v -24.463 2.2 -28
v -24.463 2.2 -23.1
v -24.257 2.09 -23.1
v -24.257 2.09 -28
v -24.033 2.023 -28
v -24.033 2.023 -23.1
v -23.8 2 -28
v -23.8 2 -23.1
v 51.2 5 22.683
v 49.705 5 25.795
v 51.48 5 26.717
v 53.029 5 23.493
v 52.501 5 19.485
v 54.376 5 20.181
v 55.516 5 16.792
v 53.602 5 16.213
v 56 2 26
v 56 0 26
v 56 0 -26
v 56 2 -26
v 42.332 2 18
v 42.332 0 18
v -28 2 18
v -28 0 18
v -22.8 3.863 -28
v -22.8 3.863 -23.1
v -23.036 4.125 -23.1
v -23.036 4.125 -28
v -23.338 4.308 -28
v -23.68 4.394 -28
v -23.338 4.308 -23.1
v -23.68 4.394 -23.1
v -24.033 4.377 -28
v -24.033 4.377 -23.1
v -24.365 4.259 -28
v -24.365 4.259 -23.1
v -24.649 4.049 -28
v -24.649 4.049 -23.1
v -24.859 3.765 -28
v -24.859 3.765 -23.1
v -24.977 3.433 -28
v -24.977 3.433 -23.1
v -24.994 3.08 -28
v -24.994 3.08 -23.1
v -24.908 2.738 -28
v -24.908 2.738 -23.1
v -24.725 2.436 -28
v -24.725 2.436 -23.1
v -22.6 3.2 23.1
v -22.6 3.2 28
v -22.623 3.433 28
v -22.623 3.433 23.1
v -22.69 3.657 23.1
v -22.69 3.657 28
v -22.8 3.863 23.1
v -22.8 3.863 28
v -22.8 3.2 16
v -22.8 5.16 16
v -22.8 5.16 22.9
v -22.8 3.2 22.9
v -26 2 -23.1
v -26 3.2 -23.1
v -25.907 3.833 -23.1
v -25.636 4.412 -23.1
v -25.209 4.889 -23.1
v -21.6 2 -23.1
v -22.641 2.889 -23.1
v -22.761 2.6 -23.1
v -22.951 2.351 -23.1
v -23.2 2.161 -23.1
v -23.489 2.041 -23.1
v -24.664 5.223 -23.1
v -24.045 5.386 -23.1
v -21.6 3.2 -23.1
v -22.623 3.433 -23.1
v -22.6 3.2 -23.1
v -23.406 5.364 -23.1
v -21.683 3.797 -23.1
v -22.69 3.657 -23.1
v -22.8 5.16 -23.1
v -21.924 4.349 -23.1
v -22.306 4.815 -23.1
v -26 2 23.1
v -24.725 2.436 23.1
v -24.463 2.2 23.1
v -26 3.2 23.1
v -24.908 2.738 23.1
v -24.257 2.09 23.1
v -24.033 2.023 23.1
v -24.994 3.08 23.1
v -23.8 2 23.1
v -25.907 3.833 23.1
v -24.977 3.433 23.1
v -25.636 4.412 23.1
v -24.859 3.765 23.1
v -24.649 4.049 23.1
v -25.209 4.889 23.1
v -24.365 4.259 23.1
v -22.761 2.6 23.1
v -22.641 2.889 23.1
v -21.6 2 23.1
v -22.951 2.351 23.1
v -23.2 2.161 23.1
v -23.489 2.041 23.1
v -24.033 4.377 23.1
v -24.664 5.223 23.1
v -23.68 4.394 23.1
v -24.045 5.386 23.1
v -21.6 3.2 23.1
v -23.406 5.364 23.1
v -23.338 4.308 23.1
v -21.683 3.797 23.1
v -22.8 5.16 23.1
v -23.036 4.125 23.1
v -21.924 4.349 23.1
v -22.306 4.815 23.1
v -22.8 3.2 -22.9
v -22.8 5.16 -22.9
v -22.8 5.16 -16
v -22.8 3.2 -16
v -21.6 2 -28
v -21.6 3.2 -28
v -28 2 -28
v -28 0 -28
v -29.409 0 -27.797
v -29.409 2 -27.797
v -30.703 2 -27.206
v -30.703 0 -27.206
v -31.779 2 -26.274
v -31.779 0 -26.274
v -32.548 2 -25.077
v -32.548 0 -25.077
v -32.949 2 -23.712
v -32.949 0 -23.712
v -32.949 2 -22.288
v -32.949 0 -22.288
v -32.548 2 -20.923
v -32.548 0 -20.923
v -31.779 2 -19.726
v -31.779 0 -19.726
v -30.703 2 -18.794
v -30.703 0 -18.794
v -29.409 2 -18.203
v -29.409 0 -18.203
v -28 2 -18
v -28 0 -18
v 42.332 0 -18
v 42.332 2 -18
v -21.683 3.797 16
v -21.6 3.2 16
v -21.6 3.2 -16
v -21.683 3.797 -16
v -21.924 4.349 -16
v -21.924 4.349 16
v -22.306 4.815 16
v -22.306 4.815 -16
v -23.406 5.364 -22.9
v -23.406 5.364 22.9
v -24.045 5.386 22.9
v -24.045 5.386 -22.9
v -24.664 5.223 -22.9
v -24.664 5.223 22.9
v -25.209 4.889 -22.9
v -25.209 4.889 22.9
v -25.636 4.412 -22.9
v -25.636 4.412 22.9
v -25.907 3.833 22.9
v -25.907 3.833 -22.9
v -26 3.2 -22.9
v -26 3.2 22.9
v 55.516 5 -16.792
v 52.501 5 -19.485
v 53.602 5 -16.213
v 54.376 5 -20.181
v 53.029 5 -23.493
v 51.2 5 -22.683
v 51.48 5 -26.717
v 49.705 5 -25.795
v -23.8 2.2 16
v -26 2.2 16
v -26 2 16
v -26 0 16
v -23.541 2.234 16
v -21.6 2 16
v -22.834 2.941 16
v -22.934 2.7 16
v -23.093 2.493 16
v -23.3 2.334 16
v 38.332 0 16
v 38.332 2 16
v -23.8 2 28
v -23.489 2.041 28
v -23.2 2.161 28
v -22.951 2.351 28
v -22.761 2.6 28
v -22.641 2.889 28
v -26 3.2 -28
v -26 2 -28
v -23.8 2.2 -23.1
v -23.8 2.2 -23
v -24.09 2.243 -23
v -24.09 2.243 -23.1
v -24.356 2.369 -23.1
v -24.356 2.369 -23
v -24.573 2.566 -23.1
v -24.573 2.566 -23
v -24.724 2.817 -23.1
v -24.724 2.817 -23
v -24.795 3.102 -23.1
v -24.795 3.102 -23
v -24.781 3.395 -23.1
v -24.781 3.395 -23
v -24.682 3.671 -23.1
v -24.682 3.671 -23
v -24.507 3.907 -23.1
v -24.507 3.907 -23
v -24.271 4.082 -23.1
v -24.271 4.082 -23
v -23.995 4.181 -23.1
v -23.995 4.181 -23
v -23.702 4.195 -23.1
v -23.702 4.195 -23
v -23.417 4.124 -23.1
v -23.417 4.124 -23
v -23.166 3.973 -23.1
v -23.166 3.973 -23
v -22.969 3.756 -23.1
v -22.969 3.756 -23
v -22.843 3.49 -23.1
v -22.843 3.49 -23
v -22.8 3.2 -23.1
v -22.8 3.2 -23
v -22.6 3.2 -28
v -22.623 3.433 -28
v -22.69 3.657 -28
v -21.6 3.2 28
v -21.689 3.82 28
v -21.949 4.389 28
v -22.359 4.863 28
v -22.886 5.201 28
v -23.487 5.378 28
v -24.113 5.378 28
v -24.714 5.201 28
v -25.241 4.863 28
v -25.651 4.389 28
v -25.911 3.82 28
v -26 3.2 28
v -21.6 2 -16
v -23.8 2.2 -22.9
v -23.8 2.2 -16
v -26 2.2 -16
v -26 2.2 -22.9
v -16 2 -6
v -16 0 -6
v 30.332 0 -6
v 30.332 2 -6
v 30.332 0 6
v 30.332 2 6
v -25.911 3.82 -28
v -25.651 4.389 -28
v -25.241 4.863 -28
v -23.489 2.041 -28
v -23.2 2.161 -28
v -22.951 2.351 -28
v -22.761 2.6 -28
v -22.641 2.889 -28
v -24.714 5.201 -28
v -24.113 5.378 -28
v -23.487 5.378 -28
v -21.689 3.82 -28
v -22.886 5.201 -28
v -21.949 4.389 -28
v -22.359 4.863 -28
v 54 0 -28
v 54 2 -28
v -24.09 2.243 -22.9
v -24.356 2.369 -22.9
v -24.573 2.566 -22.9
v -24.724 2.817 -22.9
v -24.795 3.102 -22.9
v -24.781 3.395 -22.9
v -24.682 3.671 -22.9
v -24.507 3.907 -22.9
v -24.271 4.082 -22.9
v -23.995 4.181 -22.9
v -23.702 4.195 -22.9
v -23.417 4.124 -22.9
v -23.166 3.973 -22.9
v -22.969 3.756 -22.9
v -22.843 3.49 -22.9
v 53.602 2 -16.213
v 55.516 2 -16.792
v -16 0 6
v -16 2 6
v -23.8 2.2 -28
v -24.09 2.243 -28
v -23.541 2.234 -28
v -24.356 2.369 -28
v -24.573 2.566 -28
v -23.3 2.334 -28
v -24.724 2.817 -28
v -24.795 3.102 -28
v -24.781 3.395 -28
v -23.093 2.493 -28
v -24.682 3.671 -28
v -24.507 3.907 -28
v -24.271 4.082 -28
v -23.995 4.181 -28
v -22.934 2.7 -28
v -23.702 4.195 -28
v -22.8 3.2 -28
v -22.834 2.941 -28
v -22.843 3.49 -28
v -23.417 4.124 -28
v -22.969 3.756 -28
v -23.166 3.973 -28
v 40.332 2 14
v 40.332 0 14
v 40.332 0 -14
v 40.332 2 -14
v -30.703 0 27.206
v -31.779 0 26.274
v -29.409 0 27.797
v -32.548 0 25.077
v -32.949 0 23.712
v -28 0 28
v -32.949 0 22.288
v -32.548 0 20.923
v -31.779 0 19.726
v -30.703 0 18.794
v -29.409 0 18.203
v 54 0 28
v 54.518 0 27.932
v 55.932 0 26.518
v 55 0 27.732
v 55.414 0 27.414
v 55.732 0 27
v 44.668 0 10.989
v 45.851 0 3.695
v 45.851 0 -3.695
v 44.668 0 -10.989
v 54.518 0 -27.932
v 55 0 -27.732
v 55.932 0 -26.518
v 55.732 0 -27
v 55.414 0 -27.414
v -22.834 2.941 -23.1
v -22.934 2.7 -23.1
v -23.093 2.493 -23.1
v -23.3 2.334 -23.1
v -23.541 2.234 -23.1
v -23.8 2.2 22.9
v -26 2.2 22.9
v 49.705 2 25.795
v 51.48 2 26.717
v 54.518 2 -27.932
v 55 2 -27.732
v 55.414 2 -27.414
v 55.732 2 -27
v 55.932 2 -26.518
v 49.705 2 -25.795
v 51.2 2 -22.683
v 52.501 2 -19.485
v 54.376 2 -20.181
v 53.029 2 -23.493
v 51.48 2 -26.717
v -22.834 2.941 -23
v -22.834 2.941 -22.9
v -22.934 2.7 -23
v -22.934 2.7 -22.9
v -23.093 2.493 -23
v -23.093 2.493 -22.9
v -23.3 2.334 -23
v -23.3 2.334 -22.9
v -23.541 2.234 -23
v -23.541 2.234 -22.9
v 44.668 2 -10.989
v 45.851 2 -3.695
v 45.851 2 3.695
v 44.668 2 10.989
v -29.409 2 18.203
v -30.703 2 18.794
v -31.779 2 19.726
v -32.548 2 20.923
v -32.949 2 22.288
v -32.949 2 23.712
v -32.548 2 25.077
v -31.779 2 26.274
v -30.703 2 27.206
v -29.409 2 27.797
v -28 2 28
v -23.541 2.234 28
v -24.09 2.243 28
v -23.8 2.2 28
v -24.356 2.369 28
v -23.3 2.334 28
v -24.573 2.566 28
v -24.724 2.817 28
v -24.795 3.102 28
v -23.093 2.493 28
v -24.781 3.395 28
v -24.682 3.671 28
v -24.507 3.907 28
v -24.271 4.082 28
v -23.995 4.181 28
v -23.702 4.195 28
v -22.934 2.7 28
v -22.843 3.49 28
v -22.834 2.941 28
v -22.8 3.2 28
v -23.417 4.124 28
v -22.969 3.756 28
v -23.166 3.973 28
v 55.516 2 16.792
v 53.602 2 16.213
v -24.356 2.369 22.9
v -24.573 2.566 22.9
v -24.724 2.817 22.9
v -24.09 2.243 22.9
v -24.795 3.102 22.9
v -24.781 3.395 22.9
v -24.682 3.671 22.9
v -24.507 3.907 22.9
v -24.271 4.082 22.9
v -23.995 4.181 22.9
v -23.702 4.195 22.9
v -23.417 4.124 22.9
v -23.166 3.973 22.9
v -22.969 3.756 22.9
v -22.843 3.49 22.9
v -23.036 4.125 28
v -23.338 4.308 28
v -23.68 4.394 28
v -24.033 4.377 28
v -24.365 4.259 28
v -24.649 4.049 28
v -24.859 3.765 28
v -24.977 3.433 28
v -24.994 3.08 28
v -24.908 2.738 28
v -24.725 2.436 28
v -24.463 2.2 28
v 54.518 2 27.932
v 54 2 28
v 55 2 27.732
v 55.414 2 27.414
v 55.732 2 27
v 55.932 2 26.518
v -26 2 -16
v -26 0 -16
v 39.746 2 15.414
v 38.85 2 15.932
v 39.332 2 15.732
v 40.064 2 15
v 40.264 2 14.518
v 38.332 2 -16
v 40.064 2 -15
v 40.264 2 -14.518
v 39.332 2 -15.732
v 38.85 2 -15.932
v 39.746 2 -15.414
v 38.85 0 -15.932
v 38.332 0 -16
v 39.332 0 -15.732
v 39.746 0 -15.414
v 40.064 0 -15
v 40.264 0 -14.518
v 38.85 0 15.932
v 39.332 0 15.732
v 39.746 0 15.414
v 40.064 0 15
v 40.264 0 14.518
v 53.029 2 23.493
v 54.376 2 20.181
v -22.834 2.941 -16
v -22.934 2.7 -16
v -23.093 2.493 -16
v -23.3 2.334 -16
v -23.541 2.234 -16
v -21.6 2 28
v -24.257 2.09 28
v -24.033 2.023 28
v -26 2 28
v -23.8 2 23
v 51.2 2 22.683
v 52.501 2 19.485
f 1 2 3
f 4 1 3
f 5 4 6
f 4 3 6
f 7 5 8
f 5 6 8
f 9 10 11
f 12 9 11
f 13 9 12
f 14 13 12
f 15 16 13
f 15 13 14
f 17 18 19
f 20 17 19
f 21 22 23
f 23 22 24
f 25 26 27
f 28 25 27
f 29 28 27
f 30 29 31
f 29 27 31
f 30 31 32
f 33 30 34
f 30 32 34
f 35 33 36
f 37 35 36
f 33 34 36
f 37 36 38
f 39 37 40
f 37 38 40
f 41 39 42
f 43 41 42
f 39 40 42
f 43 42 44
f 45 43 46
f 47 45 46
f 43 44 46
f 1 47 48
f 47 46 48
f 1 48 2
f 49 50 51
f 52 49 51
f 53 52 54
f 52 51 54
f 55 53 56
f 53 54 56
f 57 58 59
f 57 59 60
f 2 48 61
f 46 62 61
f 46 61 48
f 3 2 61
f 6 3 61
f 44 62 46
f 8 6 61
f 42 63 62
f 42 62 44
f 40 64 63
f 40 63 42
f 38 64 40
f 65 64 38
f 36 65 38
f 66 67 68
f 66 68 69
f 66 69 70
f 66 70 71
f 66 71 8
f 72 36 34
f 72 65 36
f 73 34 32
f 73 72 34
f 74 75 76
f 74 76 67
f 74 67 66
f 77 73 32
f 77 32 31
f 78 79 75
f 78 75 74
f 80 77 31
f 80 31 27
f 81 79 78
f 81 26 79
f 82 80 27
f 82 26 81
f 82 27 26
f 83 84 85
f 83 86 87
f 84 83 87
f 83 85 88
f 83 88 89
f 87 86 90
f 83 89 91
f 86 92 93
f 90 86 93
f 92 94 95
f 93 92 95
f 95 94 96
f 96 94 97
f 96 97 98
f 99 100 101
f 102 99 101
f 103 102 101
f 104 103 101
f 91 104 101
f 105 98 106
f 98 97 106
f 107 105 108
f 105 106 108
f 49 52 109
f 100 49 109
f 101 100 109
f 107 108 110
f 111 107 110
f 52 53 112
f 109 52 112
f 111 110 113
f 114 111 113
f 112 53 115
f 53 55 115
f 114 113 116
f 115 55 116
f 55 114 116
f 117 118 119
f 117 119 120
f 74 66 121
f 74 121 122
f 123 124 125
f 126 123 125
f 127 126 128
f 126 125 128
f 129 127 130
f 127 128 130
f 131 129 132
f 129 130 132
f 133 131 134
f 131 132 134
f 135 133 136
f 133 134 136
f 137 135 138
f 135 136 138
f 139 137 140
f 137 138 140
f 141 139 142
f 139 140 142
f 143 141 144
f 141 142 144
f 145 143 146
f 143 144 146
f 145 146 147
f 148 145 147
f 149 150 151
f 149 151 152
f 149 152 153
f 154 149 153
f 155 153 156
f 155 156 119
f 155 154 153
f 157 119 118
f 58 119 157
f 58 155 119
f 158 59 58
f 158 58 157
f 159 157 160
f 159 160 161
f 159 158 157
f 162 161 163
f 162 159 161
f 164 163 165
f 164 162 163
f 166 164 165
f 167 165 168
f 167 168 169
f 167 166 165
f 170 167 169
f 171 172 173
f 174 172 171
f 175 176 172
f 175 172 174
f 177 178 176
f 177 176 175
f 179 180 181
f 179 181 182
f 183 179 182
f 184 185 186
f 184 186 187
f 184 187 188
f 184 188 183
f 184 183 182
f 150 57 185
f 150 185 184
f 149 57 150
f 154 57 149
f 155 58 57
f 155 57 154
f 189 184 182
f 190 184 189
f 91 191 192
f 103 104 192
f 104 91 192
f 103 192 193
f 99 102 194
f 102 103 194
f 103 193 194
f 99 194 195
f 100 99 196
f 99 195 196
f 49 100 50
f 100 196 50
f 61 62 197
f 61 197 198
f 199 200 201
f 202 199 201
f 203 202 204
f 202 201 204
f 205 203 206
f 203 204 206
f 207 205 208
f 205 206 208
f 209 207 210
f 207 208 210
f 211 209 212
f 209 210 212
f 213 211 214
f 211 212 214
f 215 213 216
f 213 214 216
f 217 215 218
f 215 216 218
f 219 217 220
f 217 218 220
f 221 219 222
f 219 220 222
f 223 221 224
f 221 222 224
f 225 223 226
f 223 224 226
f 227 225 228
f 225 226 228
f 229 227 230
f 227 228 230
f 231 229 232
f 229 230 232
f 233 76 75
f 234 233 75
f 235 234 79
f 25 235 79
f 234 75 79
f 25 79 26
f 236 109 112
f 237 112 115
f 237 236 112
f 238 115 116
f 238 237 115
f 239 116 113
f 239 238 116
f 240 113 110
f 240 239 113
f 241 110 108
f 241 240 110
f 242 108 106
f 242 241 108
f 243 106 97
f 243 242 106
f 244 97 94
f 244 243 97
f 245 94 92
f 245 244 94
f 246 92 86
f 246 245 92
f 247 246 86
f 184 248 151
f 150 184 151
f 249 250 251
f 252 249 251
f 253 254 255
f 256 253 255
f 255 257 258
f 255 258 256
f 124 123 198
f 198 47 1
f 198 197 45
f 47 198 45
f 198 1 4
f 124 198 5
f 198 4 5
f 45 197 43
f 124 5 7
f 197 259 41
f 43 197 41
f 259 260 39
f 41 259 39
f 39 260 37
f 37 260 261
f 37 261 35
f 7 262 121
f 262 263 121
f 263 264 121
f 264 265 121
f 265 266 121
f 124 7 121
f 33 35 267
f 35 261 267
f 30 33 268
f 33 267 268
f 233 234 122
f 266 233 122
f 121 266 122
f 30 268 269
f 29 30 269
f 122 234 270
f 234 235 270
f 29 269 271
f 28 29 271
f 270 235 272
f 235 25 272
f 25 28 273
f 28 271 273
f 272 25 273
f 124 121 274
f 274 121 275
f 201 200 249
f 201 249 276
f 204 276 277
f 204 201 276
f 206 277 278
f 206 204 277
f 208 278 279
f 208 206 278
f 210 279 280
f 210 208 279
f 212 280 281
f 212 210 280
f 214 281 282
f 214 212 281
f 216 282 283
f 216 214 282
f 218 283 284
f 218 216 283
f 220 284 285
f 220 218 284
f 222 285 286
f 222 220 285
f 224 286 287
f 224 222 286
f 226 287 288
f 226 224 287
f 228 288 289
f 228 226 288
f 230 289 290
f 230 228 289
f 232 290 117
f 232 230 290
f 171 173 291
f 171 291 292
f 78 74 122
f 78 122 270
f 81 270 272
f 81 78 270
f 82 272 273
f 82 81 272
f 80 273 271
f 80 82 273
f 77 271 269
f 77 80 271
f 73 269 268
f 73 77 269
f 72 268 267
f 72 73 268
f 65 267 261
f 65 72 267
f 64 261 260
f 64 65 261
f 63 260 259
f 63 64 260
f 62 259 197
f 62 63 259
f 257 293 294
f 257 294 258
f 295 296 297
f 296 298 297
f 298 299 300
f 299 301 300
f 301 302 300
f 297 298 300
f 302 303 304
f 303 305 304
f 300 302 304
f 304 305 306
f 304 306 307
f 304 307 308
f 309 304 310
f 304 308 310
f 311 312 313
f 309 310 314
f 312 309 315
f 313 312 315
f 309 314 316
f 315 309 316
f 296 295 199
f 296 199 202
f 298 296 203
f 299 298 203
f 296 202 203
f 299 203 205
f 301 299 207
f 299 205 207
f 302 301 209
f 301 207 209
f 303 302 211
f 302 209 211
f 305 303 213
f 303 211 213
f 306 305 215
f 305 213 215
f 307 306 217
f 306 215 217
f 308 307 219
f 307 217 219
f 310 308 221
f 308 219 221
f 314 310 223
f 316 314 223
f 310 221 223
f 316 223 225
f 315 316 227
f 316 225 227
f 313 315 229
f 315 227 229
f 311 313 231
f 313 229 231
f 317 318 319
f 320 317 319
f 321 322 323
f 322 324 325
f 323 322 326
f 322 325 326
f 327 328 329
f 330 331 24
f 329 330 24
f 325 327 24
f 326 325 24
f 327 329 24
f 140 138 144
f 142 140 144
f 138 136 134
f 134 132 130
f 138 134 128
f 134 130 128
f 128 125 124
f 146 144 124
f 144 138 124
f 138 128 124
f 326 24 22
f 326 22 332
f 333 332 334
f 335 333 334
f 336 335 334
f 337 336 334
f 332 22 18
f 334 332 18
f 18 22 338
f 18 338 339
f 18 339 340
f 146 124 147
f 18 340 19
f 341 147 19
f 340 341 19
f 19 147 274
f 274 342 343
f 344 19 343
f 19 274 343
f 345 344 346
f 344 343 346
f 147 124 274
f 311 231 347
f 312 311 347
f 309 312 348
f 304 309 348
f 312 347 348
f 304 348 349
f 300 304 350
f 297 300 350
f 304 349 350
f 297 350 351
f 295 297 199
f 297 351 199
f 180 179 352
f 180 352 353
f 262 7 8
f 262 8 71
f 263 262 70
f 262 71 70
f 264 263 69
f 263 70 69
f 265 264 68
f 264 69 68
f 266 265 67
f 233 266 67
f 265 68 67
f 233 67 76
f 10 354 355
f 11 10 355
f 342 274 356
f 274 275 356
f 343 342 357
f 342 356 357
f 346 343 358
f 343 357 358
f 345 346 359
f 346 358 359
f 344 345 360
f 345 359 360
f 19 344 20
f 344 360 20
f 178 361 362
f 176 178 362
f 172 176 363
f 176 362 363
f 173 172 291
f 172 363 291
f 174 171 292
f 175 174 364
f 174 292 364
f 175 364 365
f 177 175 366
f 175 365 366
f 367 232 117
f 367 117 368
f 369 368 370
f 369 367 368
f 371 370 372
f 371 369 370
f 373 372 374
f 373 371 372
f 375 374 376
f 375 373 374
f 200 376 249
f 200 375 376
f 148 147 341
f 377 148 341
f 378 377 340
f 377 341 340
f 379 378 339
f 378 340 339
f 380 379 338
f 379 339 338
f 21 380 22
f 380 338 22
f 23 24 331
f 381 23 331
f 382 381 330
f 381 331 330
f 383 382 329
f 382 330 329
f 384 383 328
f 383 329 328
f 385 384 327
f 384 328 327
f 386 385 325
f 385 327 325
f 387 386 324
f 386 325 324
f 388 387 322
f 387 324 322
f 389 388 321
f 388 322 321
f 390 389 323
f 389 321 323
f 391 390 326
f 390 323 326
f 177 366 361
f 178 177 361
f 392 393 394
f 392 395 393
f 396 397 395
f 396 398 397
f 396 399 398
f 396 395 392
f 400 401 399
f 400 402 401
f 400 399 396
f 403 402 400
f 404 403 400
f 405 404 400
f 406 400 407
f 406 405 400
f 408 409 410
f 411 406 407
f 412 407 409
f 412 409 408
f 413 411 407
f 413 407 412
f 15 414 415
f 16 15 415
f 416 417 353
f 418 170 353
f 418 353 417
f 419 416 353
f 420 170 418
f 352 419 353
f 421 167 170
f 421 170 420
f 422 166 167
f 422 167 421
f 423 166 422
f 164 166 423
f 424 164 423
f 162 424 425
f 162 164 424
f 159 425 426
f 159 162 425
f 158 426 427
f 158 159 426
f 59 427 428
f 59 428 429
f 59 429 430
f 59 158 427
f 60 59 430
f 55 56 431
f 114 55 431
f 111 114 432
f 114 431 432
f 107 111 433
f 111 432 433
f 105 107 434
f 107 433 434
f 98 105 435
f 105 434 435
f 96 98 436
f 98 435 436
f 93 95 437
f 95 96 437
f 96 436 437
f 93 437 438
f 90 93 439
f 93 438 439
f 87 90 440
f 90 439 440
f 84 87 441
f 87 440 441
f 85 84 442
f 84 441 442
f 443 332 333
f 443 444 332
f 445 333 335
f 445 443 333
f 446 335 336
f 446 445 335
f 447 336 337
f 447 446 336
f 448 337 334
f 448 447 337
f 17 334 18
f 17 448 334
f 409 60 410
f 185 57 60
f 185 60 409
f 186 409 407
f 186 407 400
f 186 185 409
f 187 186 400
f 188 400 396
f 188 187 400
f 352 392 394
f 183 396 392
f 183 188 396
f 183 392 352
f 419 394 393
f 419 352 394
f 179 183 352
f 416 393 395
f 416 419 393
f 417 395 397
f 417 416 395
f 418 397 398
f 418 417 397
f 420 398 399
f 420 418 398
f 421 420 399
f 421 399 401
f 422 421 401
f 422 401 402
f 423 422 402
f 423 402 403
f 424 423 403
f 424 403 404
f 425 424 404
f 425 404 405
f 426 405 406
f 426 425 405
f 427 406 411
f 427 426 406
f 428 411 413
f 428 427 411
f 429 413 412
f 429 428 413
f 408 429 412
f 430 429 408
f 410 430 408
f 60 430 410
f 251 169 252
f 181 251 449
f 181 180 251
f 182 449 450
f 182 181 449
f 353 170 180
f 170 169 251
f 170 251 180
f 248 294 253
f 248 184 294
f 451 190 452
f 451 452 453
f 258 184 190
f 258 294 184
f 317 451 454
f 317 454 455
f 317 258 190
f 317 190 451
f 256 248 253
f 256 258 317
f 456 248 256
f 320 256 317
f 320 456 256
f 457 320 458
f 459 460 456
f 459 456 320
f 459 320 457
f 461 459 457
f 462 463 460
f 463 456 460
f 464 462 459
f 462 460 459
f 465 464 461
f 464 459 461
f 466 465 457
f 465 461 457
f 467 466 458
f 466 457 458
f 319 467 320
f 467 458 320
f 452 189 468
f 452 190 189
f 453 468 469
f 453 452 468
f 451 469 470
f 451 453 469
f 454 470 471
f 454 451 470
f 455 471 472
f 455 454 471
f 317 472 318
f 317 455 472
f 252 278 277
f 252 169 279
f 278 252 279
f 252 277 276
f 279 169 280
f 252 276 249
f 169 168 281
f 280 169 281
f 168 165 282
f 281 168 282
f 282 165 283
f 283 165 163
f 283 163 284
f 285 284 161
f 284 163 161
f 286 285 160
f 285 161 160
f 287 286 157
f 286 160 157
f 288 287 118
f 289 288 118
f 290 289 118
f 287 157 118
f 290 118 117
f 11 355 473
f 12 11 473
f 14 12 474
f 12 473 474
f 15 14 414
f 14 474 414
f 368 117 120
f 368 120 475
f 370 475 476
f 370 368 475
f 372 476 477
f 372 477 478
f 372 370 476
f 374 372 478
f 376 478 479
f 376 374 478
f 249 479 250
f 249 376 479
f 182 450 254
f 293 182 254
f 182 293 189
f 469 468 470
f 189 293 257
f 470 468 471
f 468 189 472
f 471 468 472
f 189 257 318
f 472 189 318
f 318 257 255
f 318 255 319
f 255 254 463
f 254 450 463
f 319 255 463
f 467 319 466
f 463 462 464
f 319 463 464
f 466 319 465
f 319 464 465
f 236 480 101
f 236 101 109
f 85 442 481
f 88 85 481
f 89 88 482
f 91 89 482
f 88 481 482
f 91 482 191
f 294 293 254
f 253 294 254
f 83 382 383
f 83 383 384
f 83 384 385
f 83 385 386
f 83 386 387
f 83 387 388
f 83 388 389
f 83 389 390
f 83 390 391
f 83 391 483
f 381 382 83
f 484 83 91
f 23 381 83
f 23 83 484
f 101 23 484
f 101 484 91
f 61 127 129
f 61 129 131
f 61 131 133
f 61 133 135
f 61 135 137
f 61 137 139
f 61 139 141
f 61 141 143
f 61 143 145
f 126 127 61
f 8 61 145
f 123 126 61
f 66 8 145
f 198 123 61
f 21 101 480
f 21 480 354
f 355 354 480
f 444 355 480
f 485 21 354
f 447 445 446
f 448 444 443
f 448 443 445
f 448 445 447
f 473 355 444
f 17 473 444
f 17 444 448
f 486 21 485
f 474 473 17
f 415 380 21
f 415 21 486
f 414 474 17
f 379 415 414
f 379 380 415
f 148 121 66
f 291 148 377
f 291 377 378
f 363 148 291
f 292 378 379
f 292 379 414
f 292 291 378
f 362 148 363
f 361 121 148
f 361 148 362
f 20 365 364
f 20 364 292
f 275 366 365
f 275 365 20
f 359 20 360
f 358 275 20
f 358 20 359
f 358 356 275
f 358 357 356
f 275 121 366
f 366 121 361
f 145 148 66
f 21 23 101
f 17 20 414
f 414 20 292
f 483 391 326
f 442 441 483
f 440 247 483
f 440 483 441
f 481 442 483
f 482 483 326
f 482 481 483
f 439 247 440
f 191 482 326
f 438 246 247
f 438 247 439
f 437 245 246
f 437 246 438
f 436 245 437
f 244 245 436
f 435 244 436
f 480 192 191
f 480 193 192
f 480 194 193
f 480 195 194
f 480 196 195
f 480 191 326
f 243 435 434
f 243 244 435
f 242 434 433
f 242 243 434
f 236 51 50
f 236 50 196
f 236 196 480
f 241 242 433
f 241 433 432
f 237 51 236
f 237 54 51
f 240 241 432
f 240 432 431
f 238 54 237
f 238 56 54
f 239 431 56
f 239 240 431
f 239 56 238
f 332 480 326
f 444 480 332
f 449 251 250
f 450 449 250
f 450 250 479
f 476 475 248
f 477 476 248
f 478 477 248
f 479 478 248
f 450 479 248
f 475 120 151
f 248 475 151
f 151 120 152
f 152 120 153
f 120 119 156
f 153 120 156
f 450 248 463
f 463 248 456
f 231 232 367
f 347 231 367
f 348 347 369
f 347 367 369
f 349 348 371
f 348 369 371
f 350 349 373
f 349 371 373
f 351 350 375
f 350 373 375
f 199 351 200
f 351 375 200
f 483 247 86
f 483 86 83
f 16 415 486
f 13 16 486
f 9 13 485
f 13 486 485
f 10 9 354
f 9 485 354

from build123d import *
from build123d.topology import SkipClean

# Parameters (mm, degrees)
BOSS_EXTRUDE_BASE_PLATE_DEPTH         = 2
BASE_PLATE_W                          = 66.332020977
BASE_PLATE_H                          = 32
BASE_PLATE_W_2                        = 46.332020977
BASE_PLATE_H_2                        = 12
BOSS_EXTRUDE_BASE_PLATE_2_DEPTH       = 2
EXTRUDE_THIN_RISERS_DEPTH             = 5
BOSS_EXTRUDE_START                    = 28
BOSS_EXTRUDE_HINGE_BODY_DEPTH         = 56
FILLET_LEGS_R                         = 2
CUT_EXTRUDE_START                     = 28
CUT_EXTRUDE_HINGE_PIN_LHS_DEPTH       = 5
CUT_EXTRUDE_START_2                   = 23
CUT_EXTRUDE_HINGE_SEPARATOR_LHS_DEPTH = 0.1
CUT_EXTRUDE_START_3                   = 16
CUT_EXTRUDE_HINGE_LIMITER_LHS_DEPTH   = 6.9
CUT_EXTRUDE_START_4                   = -23
CUT_EXTRUDE_HINGE_PIN_RHS_DEPTH       = 5
CUT_EXTRUDE_HINGE_SEPARATOR_RHS_DEPTH = 0.1
CUT_EXTRUDE_START_5                   = -22.9
CUT_EXTRUDE_HINGE_LIMITER_RHS_DEPTH   = 6.9


with BuildPart() as part:
    # Base plate → Boss-Extrude base plate (new body)
    with BuildSketch(Plane(origin=(0, 0, 0), x_dir=(1, 0, 0), z_dir=(0, 1, 0))):
        with BuildLine():
            Line((-28, 18), (42.332020977, 18))
            ThreePointArc((42.332020977, 18), (46, 0), (42.332020977, -18))
            Line((42.332020977, -18), (-28, -18))
            ThreePointArc((-28, -18), (-33, -23), (-28, -28))
            Line((-28, -28), (48.497422612, -28))
            Line((48.497422612, -28), (56, -28))
            Line((56, -28), (56, 28))
            Line((56, 28), (48.497422612, 28))
            Line((48.497422612, 28), (-28, 28))
            ThreePointArc((-28, 28), (-33, 23), (-28, 18))
        make_face()
    extrude(amount=BOSS_EXTRUDE_BASE_PLATE_DEPTH)

    # Sketch1<5> → Extrude-Thin risers (add)
    with BuildSketch(Plane(origin=(0, 0, 0), x_dir=(1, 0, 0), z_dir=(0, 1, 0))):
        with BuildLine():
            ThreePointArc((49.705170747, 25.795270904), (51.875157412, 21.094265653), (53.601686044, 16.212934751))
            Line((53.601686044, 16.212934751), (55.516031974, 16.791968135))
            ThreePointArc((55.516031974, 16.791968135), (53.727841606, 21.847632284), (51.480355417, 26.716530579))
            Line((51.480355417, 26.716530579), (49.705170747, 25.795270904))
        make_face()
        with BuildLine():
            ThreePointArc((53.601686044, -16.212934751), (51.875157412, -21.094265653), (49.705170747, -25.795270904))
            Line((49.705170747, -25.795270904), (51.480355417, -26.716530579))
            ThreePointArc((51.480355417, -26.716530579), (53.727841606, -21.847632284), (55.516031974, -16.791968135))
            Line((55.516031974, -16.791968135), (53.601686044, -16.212934751))
        make_face()
    extrude(amount=EXTRUDE_THIN_RISERS_DEPTH)



with BuildPart() as body_2:
    # Base plate → Boss-Extrude base plate 2 (new body)
    with BuildSketch(Plane(origin=(0, 0, 0), x_dir=(1, 0, 0), z_dir=(0, 1, 0))):
        with Locations((7.166010488, 0)):
            Rectangle(BASE_PLATE_W, BASE_PLATE_H)
        with Locations((7.166010489, 0)):
            Rectangle(BASE_PLATE_W_2, BASE_PLATE_H_2, mode=Mode.SUBTRACT)
    extrude(amount=BOSS_EXTRUDE_BASE_PLATE_2_DEPTH)


with BuildPart() as part_1:
    add(part.part)

    add(body_2.part)  # Boss-Extrude hinge body merges body 2
    # Hinge → Boss-Extrude hinge body (add)
    with BuildSketch(Plane.XY.offset(BOSS_EXTRUDE_START)):
        with BuildLine():
            Line((-26, 3.2), (-26, 2))
            Line((-26, 2), (-21.6, 2))
            Line((-21.6, 2), (-21.6, 3.2))
            ThreePointArc((-21.6, 3.2), (-23.8, 5.4), (-26, 3.2))
        make_face()
    extrude(amount=-BOSS_EXTRUDE_HINGE_BODY_DEPTH)

    # Fillet legs
    fillet_legs_edges = [part_1.edges().sort_by_distance(p)[0] for p in [
        (56, 1, -28),
        (56, 1, 28),
        (40.332020977, 1, -16),
        (40.332020977, 1, 16),
    ]]
    fillet(fillet_legs_edges, radius=FILLET_LEGS_R)

    # Hinge<3> → Cut-Extrude hinge pin LHS (cut)
    with BuildSketch(Plane.XY.offset(CUT_EXTRUDE_START)):
        with BuildLine():
            ThreePointArc((-23.8, 2.2), (-24.507106781, 3.907106781), (-22.8, 3.2))
            Line((-22.8, 3.2), (-22.8, 3.863324958))
            ThreePointArc((-22.8, 3.863324958), (-24.648528137, 4.048528137), (-24.463324958, 2.2))
            Line((-24.463324958, 2.2), (-23.8, 2.2))
        make_face()
        with BuildLine():
            Line((-22.8, 3.863324958), (-22.8, 3.2))
            ThreePointArc((-22.8, 3.2), (-23.092893219, 2.492893219), (-23.8, 2.2))
            Line((-23.8, 2.2), (-24.463324958, 2.2))
            ThreePointArc((-24.463324958, 2.2), (-24.146410162, 2.051087471), (-23.8, 2))
            ThreePointArc((-23.8, 2), (-22.951471863, 2.351471863), (-22.6, 3.2))
            ThreePointArc((-22.6, 3.2), (-22.651087471, 3.546410162), (-22.8, 3.863324958))
        make_face()
    extrude(amount=-CUT_EXTRUDE_HINGE_PIN_LHS_DEPTH, mode=Mode.SUBTRACT)

    # Hinge<4> → Cut-Extrude hinge separator LHS (cut, symmetric)
    with SkipClean():  # the faces are left unmerged after this step: merging them gives an invalid solid
        with BuildSketch(Plane.XY.offset(CUT_EXTRUDE_START_2)):
            with BuildLine():
                ThreePointArc((-24.463324958, 2.2), (-24.648528137, 4.048528137), (-22.8, 3.863324958))
                Line((-22.8, 3.863324958), (-22.8, 5.159591794))
                ThreePointArc((-22.8, 5.159591794), (-24.948912529, 5.076166304), (-26, 3.2))
                Line((-26, 3.2), (-26, 2.2))
                Line((-26, 2.2), (-24.463324958, 2.2))
            make_face()
            with BuildLine():
                Line((-22.8, 5.159591794), (-22.8, 3.863324958))
                ThreePointArc((-22.8, 3.863324958), (-22.651087471, 3.546410162), (-22.6, 3.2))
                ThreePointArc((-22.6, 3.2), (-22.951471863, 2.351471863), (-23.8, 2))
                Line((-23.8, 2), (-21.6, 2))
                Line((-21.6, 2), (-21.6, 3.2))
                ThreePointArc((-21.6, 3.2), (-21.923833696, 4.348912529), (-22.8, 5.159591794))
            make_face()
            with BuildLine():
                ThreePointArc((-23.8, 2.2), (-24.507106781, 3.907106781), (-22.8, 3.2))
                Line((-22.8, 3.2), (-22.8, 3.863324958))
                ThreePointArc((-22.8, 3.863324958), (-24.648528137, 4.048528137), (-24.463324958, 2.2))
                Line((-24.463324958, 2.2), (-23.8, 2.2))
            make_face()
            with BuildLine():
                Line((-22.8, 3.863324958), (-22.8, 3.2))
                ThreePointArc((-22.8, 3.2), (-23.092893219, 2.492893219), (-23.8, 2.2))
                Line((-23.8, 2.2), (-24.463324958, 2.2))
                ThreePointArc((-24.463324958, 2.2), (-24.146410162, 2.051087471), (-23.8, 2))
                ThreePointArc((-23.8, 2), (-22.951471863, 2.351471863), (-22.6, 3.2))
                ThreePointArc((-22.6, 3.2), (-22.651087471, 3.546410162), (-22.8, 3.863324958))
            make_face()
            with BuildLine():
                ThreePointArc((-23.8, 2), (-24.146410162, 2.051087471), (-24.463324958, 2.2))
                Line((-24.463324958, 2.2), (-26, 2.2))
                Line((-26, 2.2), (-26, 2))
                Line((-26, 2), (-23.8, 2))
            make_face()
        extrude(amount=CUT_EXTRUDE_HINGE_SEPARATOR_LHS_DEPTH, both=True, mode=Mode.SUBTRACT)

    # Hinge<5> → Cut-Extrude hinge limiter LHS (cut)
    with BuildSketch(Plane.XY.offset(CUT_EXTRUDE_START_3)):
        with BuildLine():
            ThreePointArc((-23.8, 2), (-24.146410162, 2.051087471), (-24.463324958, 2.2))
            Line((-24.463324958, 2.2), (-26, 2.2))
            Line((-26, 2.2), (-26, 2))
            Line((-26, 2), (-23.8, 2))
        make_face()
        with BuildLine():
            Line((-22.8, 3.863324958), (-22.8, 3.2))
            ThreePointArc((-22.8, 3.2), (-23.092893219, 2.492893219), (-23.8, 2.2))
            Line((-23.8, 2.2), (-24.463324958, 2.2))
            ThreePointArc((-24.463324958, 2.2), (-24.146410162, 2.051087471), (-23.8, 2))
            ThreePointArc((-23.8, 2), (-22.951471863, 2.351471863), (-22.6, 3.2))
            ThreePointArc((-22.6, 3.2), (-22.651087471, 3.546410162), (-22.8, 3.863324958))
        make_face()
        with BuildLine():
            Line((-22.8, 5.159591794), (-22.8, 3.863324958))
            ThreePointArc((-22.8, 3.863324958), (-22.651087471, 3.546410162), (-22.6, 3.2))
            ThreePointArc((-22.6, 3.2), (-22.951471863, 2.351471863), (-23.8, 2))
            Line((-23.8, 2), (-21.6, 2))
            Line((-21.6, 2), (-21.6, 3.2))
            ThreePointArc((-21.6, 3.2), (-21.923833696, 4.348912529), (-22.8, 5.159591794))
        make_face()
    extrude(amount=CUT_EXTRUDE_HINGE_LIMITER_LHS_DEPTH, mode=Mode.SUBTRACT)

    # Hinge<6> → Cut-Extrude hinge pin RHS (cut)
    with BuildSketch(Plane.XY.offset(CUT_EXTRUDE_START_4)):
        with BuildLine():
            ThreePointArc((-23.8, 2.2), (-24.507106781, 3.907106781), (-22.8, 3.2))
            Line((-22.8, 3.2), (-22.8, 3.863324958))
            ThreePointArc((-22.8, 3.863324958), (-24.648528137, 4.048528137), (-24.463324958, 2.2))
            Line((-24.463324958, 2.2), (-23.8, 2.2))
        make_face()
        with BuildLine():
            Line((-22.8, 3.863324958), (-22.8, 3.2))
            ThreePointArc((-22.8, 3.2), (-23.092893219, 2.492893219), (-23.8, 2.2))
            Line((-23.8, 2.2), (-24.463324958, 2.2))
            ThreePointArc((-24.463324958, 2.2), (-24.146410162, 2.051087471), (-23.8, 2))
            ThreePointArc((-23.8, 2), (-22.951471863, 2.351471863), (-22.6, 3.2))
            ThreePointArc((-22.6, 3.2), (-22.651087471, 3.546410162), (-22.8, 3.863324958))
        make_face()
    extrude(amount=-CUT_EXTRUDE_HINGE_PIN_RHS_DEPTH, mode=Mode.SUBTRACT)

    # Hinge<7> → Cut-Extrude hinge separator RHS (cut, symmetric)
    with SkipClean():  # the faces are left unmerged after this step: merging them gives an invalid solid
        with BuildSketch(Plane.XY.offset(CUT_EXTRUDE_START_4)):
            with BuildLine():
                Line((-22.8, 5.159591794), (-22.8, 3.863324958))
                ThreePointArc((-22.8, 3.863324958), (-22.651087471, 3.546410162), (-22.6, 3.2))
                ThreePointArc((-22.6, 3.2), (-22.951471863, 2.351471863), (-23.8, 2))
                Line((-23.8, 2), (-21.6, 2))
                Line((-21.6, 2), (-21.6, 3.2))
                ThreePointArc((-21.6, 3.2), (-21.923833696, 4.348912529), (-22.8, 5.159591794))
            make_face()
            with BuildLine():
                ThreePointArc((-24.463324958, 2.2), (-24.648528137, 4.048528137), (-22.8, 3.863324958))
                Line((-22.8, 3.863324958), (-22.8, 5.159591794))
                ThreePointArc((-22.8, 5.159591794), (-24.948912529, 5.076166304), (-26, 3.2))
                Line((-26, 3.2), (-26, 2.2))
                Line((-26, 2.2), (-24.463324958, 2.2))
            make_face()
            with BuildLine():
                ThreePointArc((-23.8, 2), (-24.146410162, 2.051087471), (-24.463324958, 2.2))
                Line((-24.463324958, 2.2), (-26, 2.2))
                Line((-26, 2.2), (-26, 2))
                Line((-26, 2), (-23.8, 2))
            make_face()
            with BuildLine():
                ThreePointArc((-23.8, 2.2), (-24.507106781, 3.907106781), (-22.8, 3.2))
                Line((-22.8, 3.2), (-22.8, 3.863324958))
                ThreePointArc((-22.8, 3.863324958), (-24.648528137, 4.048528137), (-24.463324958, 2.2))
                Line((-24.463324958, 2.2), (-23.8, 2.2))
            make_face()
            with BuildLine():
                Line((-22.8, 3.863324958), (-22.8, 3.2))
                ThreePointArc((-22.8, 3.2), (-23.092893219, 2.492893219), (-23.8, 2.2))
                Line((-23.8, 2.2), (-24.463324958, 2.2))
                ThreePointArc((-24.463324958, 2.2), (-24.146410162, 2.051087471), (-23.8, 2))
                ThreePointArc((-23.8, 2), (-22.951471863, 2.351471863), (-22.6, 3.2))
                ThreePointArc((-22.6, 3.2), (-22.651087471, 3.546410162), (-22.8, 3.863324958))
            make_face()
        extrude(amount=CUT_EXTRUDE_HINGE_SEPARATOR_RHS_DEPTH, both=True, mode=Mode.SUBTRACT)

    # Hinge<8> → Cut-Extrude hinge limiter RHS (cut)
    with BuildSketch(Plane.XY.offset(CUT_EXTRUDE_START_5)):
        with BuildLine():
            ThreePointArc((-23.8, 2), (-24.146410162, 2.051087471), (-24.463324958, 2.2))
            Line((-24.463324958, 2.2), (-26, 2.2))
            Line((-26, 2.2), (-26, 2))
            Line((-26, 2), (-23.8, 2))
        make_face()
        with BuildLine():
            Line((-22.8, 3.863324958), (-22.8, 3.2))
            ThreePointArc((-22.8, 3.2), (-23.092893219, 2.492893219), (-23.8, 2.2))
            Line((-23.8, 2.2), (-24.463324958, 2.2))
            ThreePointArc((-24.463324958, 2.2), (-24.146410162, 2.051087471), (-23.8, 2))
            ThreePointArc((-23.8, 2), (-22.951471863, 2.351471863), (-22.6, 3.2))
            ThreePointArc((-22.6, 3.2), (-22.651087471, 3.546410162), (-22.8, 3.863324958))
        make_face()
        with BuildLine():
            Line((-22.8, 5.159591794), (-22.8, 3.863324958))
            ThreePointArc((-22.8, 3.863324958), (-22.651087471, 3.546410162), (-22.6, 3.2))
            ThreePointArc((-22.6, 3.2), (-22.951471863, 2.351471863), (-23.8, 2))
            Line((-23.8, 2), (-21.6, 2))
            Line((-21.6, 2), (-21.6, 3.2))
            ThreePointArc((-21.6, 3.2), (-21.923833696, 4.348912529), (-22.8, 5.159591794))
        make_face()
    extrude(amount=CUT_EXTRUDE_HINGE_LIMITER_RHS_DEPTH, mode=Mode.SUBTRACT)


with BuildPart() as cut_extrude_hinge_limiter_rhs_piece_1:
    # of the separate pieces the step leaves, piece 1, a body of its own (cut_extrude_hinge_limiter_rhs_pieces)
    add(part_1.part.solids().sort_by_distance((54, 0, 28))[0])


with BuildPart() as cut_extrude_hinge_limiter_rhs_piece_2:
    # of the separate pieces the step leaves, piece 2, a body of its own (cut_extrude_hinge_limiter_rhs_pieces)
    add(part_1.part.solids().sort_by_distance((38.332020977, 0, -16))[0])


solid = Compound([cut_extrude_hinge_limiter_rhs_piece_1.part, cut_extrude_hinge_limiter_rhs_piece_2.part])
